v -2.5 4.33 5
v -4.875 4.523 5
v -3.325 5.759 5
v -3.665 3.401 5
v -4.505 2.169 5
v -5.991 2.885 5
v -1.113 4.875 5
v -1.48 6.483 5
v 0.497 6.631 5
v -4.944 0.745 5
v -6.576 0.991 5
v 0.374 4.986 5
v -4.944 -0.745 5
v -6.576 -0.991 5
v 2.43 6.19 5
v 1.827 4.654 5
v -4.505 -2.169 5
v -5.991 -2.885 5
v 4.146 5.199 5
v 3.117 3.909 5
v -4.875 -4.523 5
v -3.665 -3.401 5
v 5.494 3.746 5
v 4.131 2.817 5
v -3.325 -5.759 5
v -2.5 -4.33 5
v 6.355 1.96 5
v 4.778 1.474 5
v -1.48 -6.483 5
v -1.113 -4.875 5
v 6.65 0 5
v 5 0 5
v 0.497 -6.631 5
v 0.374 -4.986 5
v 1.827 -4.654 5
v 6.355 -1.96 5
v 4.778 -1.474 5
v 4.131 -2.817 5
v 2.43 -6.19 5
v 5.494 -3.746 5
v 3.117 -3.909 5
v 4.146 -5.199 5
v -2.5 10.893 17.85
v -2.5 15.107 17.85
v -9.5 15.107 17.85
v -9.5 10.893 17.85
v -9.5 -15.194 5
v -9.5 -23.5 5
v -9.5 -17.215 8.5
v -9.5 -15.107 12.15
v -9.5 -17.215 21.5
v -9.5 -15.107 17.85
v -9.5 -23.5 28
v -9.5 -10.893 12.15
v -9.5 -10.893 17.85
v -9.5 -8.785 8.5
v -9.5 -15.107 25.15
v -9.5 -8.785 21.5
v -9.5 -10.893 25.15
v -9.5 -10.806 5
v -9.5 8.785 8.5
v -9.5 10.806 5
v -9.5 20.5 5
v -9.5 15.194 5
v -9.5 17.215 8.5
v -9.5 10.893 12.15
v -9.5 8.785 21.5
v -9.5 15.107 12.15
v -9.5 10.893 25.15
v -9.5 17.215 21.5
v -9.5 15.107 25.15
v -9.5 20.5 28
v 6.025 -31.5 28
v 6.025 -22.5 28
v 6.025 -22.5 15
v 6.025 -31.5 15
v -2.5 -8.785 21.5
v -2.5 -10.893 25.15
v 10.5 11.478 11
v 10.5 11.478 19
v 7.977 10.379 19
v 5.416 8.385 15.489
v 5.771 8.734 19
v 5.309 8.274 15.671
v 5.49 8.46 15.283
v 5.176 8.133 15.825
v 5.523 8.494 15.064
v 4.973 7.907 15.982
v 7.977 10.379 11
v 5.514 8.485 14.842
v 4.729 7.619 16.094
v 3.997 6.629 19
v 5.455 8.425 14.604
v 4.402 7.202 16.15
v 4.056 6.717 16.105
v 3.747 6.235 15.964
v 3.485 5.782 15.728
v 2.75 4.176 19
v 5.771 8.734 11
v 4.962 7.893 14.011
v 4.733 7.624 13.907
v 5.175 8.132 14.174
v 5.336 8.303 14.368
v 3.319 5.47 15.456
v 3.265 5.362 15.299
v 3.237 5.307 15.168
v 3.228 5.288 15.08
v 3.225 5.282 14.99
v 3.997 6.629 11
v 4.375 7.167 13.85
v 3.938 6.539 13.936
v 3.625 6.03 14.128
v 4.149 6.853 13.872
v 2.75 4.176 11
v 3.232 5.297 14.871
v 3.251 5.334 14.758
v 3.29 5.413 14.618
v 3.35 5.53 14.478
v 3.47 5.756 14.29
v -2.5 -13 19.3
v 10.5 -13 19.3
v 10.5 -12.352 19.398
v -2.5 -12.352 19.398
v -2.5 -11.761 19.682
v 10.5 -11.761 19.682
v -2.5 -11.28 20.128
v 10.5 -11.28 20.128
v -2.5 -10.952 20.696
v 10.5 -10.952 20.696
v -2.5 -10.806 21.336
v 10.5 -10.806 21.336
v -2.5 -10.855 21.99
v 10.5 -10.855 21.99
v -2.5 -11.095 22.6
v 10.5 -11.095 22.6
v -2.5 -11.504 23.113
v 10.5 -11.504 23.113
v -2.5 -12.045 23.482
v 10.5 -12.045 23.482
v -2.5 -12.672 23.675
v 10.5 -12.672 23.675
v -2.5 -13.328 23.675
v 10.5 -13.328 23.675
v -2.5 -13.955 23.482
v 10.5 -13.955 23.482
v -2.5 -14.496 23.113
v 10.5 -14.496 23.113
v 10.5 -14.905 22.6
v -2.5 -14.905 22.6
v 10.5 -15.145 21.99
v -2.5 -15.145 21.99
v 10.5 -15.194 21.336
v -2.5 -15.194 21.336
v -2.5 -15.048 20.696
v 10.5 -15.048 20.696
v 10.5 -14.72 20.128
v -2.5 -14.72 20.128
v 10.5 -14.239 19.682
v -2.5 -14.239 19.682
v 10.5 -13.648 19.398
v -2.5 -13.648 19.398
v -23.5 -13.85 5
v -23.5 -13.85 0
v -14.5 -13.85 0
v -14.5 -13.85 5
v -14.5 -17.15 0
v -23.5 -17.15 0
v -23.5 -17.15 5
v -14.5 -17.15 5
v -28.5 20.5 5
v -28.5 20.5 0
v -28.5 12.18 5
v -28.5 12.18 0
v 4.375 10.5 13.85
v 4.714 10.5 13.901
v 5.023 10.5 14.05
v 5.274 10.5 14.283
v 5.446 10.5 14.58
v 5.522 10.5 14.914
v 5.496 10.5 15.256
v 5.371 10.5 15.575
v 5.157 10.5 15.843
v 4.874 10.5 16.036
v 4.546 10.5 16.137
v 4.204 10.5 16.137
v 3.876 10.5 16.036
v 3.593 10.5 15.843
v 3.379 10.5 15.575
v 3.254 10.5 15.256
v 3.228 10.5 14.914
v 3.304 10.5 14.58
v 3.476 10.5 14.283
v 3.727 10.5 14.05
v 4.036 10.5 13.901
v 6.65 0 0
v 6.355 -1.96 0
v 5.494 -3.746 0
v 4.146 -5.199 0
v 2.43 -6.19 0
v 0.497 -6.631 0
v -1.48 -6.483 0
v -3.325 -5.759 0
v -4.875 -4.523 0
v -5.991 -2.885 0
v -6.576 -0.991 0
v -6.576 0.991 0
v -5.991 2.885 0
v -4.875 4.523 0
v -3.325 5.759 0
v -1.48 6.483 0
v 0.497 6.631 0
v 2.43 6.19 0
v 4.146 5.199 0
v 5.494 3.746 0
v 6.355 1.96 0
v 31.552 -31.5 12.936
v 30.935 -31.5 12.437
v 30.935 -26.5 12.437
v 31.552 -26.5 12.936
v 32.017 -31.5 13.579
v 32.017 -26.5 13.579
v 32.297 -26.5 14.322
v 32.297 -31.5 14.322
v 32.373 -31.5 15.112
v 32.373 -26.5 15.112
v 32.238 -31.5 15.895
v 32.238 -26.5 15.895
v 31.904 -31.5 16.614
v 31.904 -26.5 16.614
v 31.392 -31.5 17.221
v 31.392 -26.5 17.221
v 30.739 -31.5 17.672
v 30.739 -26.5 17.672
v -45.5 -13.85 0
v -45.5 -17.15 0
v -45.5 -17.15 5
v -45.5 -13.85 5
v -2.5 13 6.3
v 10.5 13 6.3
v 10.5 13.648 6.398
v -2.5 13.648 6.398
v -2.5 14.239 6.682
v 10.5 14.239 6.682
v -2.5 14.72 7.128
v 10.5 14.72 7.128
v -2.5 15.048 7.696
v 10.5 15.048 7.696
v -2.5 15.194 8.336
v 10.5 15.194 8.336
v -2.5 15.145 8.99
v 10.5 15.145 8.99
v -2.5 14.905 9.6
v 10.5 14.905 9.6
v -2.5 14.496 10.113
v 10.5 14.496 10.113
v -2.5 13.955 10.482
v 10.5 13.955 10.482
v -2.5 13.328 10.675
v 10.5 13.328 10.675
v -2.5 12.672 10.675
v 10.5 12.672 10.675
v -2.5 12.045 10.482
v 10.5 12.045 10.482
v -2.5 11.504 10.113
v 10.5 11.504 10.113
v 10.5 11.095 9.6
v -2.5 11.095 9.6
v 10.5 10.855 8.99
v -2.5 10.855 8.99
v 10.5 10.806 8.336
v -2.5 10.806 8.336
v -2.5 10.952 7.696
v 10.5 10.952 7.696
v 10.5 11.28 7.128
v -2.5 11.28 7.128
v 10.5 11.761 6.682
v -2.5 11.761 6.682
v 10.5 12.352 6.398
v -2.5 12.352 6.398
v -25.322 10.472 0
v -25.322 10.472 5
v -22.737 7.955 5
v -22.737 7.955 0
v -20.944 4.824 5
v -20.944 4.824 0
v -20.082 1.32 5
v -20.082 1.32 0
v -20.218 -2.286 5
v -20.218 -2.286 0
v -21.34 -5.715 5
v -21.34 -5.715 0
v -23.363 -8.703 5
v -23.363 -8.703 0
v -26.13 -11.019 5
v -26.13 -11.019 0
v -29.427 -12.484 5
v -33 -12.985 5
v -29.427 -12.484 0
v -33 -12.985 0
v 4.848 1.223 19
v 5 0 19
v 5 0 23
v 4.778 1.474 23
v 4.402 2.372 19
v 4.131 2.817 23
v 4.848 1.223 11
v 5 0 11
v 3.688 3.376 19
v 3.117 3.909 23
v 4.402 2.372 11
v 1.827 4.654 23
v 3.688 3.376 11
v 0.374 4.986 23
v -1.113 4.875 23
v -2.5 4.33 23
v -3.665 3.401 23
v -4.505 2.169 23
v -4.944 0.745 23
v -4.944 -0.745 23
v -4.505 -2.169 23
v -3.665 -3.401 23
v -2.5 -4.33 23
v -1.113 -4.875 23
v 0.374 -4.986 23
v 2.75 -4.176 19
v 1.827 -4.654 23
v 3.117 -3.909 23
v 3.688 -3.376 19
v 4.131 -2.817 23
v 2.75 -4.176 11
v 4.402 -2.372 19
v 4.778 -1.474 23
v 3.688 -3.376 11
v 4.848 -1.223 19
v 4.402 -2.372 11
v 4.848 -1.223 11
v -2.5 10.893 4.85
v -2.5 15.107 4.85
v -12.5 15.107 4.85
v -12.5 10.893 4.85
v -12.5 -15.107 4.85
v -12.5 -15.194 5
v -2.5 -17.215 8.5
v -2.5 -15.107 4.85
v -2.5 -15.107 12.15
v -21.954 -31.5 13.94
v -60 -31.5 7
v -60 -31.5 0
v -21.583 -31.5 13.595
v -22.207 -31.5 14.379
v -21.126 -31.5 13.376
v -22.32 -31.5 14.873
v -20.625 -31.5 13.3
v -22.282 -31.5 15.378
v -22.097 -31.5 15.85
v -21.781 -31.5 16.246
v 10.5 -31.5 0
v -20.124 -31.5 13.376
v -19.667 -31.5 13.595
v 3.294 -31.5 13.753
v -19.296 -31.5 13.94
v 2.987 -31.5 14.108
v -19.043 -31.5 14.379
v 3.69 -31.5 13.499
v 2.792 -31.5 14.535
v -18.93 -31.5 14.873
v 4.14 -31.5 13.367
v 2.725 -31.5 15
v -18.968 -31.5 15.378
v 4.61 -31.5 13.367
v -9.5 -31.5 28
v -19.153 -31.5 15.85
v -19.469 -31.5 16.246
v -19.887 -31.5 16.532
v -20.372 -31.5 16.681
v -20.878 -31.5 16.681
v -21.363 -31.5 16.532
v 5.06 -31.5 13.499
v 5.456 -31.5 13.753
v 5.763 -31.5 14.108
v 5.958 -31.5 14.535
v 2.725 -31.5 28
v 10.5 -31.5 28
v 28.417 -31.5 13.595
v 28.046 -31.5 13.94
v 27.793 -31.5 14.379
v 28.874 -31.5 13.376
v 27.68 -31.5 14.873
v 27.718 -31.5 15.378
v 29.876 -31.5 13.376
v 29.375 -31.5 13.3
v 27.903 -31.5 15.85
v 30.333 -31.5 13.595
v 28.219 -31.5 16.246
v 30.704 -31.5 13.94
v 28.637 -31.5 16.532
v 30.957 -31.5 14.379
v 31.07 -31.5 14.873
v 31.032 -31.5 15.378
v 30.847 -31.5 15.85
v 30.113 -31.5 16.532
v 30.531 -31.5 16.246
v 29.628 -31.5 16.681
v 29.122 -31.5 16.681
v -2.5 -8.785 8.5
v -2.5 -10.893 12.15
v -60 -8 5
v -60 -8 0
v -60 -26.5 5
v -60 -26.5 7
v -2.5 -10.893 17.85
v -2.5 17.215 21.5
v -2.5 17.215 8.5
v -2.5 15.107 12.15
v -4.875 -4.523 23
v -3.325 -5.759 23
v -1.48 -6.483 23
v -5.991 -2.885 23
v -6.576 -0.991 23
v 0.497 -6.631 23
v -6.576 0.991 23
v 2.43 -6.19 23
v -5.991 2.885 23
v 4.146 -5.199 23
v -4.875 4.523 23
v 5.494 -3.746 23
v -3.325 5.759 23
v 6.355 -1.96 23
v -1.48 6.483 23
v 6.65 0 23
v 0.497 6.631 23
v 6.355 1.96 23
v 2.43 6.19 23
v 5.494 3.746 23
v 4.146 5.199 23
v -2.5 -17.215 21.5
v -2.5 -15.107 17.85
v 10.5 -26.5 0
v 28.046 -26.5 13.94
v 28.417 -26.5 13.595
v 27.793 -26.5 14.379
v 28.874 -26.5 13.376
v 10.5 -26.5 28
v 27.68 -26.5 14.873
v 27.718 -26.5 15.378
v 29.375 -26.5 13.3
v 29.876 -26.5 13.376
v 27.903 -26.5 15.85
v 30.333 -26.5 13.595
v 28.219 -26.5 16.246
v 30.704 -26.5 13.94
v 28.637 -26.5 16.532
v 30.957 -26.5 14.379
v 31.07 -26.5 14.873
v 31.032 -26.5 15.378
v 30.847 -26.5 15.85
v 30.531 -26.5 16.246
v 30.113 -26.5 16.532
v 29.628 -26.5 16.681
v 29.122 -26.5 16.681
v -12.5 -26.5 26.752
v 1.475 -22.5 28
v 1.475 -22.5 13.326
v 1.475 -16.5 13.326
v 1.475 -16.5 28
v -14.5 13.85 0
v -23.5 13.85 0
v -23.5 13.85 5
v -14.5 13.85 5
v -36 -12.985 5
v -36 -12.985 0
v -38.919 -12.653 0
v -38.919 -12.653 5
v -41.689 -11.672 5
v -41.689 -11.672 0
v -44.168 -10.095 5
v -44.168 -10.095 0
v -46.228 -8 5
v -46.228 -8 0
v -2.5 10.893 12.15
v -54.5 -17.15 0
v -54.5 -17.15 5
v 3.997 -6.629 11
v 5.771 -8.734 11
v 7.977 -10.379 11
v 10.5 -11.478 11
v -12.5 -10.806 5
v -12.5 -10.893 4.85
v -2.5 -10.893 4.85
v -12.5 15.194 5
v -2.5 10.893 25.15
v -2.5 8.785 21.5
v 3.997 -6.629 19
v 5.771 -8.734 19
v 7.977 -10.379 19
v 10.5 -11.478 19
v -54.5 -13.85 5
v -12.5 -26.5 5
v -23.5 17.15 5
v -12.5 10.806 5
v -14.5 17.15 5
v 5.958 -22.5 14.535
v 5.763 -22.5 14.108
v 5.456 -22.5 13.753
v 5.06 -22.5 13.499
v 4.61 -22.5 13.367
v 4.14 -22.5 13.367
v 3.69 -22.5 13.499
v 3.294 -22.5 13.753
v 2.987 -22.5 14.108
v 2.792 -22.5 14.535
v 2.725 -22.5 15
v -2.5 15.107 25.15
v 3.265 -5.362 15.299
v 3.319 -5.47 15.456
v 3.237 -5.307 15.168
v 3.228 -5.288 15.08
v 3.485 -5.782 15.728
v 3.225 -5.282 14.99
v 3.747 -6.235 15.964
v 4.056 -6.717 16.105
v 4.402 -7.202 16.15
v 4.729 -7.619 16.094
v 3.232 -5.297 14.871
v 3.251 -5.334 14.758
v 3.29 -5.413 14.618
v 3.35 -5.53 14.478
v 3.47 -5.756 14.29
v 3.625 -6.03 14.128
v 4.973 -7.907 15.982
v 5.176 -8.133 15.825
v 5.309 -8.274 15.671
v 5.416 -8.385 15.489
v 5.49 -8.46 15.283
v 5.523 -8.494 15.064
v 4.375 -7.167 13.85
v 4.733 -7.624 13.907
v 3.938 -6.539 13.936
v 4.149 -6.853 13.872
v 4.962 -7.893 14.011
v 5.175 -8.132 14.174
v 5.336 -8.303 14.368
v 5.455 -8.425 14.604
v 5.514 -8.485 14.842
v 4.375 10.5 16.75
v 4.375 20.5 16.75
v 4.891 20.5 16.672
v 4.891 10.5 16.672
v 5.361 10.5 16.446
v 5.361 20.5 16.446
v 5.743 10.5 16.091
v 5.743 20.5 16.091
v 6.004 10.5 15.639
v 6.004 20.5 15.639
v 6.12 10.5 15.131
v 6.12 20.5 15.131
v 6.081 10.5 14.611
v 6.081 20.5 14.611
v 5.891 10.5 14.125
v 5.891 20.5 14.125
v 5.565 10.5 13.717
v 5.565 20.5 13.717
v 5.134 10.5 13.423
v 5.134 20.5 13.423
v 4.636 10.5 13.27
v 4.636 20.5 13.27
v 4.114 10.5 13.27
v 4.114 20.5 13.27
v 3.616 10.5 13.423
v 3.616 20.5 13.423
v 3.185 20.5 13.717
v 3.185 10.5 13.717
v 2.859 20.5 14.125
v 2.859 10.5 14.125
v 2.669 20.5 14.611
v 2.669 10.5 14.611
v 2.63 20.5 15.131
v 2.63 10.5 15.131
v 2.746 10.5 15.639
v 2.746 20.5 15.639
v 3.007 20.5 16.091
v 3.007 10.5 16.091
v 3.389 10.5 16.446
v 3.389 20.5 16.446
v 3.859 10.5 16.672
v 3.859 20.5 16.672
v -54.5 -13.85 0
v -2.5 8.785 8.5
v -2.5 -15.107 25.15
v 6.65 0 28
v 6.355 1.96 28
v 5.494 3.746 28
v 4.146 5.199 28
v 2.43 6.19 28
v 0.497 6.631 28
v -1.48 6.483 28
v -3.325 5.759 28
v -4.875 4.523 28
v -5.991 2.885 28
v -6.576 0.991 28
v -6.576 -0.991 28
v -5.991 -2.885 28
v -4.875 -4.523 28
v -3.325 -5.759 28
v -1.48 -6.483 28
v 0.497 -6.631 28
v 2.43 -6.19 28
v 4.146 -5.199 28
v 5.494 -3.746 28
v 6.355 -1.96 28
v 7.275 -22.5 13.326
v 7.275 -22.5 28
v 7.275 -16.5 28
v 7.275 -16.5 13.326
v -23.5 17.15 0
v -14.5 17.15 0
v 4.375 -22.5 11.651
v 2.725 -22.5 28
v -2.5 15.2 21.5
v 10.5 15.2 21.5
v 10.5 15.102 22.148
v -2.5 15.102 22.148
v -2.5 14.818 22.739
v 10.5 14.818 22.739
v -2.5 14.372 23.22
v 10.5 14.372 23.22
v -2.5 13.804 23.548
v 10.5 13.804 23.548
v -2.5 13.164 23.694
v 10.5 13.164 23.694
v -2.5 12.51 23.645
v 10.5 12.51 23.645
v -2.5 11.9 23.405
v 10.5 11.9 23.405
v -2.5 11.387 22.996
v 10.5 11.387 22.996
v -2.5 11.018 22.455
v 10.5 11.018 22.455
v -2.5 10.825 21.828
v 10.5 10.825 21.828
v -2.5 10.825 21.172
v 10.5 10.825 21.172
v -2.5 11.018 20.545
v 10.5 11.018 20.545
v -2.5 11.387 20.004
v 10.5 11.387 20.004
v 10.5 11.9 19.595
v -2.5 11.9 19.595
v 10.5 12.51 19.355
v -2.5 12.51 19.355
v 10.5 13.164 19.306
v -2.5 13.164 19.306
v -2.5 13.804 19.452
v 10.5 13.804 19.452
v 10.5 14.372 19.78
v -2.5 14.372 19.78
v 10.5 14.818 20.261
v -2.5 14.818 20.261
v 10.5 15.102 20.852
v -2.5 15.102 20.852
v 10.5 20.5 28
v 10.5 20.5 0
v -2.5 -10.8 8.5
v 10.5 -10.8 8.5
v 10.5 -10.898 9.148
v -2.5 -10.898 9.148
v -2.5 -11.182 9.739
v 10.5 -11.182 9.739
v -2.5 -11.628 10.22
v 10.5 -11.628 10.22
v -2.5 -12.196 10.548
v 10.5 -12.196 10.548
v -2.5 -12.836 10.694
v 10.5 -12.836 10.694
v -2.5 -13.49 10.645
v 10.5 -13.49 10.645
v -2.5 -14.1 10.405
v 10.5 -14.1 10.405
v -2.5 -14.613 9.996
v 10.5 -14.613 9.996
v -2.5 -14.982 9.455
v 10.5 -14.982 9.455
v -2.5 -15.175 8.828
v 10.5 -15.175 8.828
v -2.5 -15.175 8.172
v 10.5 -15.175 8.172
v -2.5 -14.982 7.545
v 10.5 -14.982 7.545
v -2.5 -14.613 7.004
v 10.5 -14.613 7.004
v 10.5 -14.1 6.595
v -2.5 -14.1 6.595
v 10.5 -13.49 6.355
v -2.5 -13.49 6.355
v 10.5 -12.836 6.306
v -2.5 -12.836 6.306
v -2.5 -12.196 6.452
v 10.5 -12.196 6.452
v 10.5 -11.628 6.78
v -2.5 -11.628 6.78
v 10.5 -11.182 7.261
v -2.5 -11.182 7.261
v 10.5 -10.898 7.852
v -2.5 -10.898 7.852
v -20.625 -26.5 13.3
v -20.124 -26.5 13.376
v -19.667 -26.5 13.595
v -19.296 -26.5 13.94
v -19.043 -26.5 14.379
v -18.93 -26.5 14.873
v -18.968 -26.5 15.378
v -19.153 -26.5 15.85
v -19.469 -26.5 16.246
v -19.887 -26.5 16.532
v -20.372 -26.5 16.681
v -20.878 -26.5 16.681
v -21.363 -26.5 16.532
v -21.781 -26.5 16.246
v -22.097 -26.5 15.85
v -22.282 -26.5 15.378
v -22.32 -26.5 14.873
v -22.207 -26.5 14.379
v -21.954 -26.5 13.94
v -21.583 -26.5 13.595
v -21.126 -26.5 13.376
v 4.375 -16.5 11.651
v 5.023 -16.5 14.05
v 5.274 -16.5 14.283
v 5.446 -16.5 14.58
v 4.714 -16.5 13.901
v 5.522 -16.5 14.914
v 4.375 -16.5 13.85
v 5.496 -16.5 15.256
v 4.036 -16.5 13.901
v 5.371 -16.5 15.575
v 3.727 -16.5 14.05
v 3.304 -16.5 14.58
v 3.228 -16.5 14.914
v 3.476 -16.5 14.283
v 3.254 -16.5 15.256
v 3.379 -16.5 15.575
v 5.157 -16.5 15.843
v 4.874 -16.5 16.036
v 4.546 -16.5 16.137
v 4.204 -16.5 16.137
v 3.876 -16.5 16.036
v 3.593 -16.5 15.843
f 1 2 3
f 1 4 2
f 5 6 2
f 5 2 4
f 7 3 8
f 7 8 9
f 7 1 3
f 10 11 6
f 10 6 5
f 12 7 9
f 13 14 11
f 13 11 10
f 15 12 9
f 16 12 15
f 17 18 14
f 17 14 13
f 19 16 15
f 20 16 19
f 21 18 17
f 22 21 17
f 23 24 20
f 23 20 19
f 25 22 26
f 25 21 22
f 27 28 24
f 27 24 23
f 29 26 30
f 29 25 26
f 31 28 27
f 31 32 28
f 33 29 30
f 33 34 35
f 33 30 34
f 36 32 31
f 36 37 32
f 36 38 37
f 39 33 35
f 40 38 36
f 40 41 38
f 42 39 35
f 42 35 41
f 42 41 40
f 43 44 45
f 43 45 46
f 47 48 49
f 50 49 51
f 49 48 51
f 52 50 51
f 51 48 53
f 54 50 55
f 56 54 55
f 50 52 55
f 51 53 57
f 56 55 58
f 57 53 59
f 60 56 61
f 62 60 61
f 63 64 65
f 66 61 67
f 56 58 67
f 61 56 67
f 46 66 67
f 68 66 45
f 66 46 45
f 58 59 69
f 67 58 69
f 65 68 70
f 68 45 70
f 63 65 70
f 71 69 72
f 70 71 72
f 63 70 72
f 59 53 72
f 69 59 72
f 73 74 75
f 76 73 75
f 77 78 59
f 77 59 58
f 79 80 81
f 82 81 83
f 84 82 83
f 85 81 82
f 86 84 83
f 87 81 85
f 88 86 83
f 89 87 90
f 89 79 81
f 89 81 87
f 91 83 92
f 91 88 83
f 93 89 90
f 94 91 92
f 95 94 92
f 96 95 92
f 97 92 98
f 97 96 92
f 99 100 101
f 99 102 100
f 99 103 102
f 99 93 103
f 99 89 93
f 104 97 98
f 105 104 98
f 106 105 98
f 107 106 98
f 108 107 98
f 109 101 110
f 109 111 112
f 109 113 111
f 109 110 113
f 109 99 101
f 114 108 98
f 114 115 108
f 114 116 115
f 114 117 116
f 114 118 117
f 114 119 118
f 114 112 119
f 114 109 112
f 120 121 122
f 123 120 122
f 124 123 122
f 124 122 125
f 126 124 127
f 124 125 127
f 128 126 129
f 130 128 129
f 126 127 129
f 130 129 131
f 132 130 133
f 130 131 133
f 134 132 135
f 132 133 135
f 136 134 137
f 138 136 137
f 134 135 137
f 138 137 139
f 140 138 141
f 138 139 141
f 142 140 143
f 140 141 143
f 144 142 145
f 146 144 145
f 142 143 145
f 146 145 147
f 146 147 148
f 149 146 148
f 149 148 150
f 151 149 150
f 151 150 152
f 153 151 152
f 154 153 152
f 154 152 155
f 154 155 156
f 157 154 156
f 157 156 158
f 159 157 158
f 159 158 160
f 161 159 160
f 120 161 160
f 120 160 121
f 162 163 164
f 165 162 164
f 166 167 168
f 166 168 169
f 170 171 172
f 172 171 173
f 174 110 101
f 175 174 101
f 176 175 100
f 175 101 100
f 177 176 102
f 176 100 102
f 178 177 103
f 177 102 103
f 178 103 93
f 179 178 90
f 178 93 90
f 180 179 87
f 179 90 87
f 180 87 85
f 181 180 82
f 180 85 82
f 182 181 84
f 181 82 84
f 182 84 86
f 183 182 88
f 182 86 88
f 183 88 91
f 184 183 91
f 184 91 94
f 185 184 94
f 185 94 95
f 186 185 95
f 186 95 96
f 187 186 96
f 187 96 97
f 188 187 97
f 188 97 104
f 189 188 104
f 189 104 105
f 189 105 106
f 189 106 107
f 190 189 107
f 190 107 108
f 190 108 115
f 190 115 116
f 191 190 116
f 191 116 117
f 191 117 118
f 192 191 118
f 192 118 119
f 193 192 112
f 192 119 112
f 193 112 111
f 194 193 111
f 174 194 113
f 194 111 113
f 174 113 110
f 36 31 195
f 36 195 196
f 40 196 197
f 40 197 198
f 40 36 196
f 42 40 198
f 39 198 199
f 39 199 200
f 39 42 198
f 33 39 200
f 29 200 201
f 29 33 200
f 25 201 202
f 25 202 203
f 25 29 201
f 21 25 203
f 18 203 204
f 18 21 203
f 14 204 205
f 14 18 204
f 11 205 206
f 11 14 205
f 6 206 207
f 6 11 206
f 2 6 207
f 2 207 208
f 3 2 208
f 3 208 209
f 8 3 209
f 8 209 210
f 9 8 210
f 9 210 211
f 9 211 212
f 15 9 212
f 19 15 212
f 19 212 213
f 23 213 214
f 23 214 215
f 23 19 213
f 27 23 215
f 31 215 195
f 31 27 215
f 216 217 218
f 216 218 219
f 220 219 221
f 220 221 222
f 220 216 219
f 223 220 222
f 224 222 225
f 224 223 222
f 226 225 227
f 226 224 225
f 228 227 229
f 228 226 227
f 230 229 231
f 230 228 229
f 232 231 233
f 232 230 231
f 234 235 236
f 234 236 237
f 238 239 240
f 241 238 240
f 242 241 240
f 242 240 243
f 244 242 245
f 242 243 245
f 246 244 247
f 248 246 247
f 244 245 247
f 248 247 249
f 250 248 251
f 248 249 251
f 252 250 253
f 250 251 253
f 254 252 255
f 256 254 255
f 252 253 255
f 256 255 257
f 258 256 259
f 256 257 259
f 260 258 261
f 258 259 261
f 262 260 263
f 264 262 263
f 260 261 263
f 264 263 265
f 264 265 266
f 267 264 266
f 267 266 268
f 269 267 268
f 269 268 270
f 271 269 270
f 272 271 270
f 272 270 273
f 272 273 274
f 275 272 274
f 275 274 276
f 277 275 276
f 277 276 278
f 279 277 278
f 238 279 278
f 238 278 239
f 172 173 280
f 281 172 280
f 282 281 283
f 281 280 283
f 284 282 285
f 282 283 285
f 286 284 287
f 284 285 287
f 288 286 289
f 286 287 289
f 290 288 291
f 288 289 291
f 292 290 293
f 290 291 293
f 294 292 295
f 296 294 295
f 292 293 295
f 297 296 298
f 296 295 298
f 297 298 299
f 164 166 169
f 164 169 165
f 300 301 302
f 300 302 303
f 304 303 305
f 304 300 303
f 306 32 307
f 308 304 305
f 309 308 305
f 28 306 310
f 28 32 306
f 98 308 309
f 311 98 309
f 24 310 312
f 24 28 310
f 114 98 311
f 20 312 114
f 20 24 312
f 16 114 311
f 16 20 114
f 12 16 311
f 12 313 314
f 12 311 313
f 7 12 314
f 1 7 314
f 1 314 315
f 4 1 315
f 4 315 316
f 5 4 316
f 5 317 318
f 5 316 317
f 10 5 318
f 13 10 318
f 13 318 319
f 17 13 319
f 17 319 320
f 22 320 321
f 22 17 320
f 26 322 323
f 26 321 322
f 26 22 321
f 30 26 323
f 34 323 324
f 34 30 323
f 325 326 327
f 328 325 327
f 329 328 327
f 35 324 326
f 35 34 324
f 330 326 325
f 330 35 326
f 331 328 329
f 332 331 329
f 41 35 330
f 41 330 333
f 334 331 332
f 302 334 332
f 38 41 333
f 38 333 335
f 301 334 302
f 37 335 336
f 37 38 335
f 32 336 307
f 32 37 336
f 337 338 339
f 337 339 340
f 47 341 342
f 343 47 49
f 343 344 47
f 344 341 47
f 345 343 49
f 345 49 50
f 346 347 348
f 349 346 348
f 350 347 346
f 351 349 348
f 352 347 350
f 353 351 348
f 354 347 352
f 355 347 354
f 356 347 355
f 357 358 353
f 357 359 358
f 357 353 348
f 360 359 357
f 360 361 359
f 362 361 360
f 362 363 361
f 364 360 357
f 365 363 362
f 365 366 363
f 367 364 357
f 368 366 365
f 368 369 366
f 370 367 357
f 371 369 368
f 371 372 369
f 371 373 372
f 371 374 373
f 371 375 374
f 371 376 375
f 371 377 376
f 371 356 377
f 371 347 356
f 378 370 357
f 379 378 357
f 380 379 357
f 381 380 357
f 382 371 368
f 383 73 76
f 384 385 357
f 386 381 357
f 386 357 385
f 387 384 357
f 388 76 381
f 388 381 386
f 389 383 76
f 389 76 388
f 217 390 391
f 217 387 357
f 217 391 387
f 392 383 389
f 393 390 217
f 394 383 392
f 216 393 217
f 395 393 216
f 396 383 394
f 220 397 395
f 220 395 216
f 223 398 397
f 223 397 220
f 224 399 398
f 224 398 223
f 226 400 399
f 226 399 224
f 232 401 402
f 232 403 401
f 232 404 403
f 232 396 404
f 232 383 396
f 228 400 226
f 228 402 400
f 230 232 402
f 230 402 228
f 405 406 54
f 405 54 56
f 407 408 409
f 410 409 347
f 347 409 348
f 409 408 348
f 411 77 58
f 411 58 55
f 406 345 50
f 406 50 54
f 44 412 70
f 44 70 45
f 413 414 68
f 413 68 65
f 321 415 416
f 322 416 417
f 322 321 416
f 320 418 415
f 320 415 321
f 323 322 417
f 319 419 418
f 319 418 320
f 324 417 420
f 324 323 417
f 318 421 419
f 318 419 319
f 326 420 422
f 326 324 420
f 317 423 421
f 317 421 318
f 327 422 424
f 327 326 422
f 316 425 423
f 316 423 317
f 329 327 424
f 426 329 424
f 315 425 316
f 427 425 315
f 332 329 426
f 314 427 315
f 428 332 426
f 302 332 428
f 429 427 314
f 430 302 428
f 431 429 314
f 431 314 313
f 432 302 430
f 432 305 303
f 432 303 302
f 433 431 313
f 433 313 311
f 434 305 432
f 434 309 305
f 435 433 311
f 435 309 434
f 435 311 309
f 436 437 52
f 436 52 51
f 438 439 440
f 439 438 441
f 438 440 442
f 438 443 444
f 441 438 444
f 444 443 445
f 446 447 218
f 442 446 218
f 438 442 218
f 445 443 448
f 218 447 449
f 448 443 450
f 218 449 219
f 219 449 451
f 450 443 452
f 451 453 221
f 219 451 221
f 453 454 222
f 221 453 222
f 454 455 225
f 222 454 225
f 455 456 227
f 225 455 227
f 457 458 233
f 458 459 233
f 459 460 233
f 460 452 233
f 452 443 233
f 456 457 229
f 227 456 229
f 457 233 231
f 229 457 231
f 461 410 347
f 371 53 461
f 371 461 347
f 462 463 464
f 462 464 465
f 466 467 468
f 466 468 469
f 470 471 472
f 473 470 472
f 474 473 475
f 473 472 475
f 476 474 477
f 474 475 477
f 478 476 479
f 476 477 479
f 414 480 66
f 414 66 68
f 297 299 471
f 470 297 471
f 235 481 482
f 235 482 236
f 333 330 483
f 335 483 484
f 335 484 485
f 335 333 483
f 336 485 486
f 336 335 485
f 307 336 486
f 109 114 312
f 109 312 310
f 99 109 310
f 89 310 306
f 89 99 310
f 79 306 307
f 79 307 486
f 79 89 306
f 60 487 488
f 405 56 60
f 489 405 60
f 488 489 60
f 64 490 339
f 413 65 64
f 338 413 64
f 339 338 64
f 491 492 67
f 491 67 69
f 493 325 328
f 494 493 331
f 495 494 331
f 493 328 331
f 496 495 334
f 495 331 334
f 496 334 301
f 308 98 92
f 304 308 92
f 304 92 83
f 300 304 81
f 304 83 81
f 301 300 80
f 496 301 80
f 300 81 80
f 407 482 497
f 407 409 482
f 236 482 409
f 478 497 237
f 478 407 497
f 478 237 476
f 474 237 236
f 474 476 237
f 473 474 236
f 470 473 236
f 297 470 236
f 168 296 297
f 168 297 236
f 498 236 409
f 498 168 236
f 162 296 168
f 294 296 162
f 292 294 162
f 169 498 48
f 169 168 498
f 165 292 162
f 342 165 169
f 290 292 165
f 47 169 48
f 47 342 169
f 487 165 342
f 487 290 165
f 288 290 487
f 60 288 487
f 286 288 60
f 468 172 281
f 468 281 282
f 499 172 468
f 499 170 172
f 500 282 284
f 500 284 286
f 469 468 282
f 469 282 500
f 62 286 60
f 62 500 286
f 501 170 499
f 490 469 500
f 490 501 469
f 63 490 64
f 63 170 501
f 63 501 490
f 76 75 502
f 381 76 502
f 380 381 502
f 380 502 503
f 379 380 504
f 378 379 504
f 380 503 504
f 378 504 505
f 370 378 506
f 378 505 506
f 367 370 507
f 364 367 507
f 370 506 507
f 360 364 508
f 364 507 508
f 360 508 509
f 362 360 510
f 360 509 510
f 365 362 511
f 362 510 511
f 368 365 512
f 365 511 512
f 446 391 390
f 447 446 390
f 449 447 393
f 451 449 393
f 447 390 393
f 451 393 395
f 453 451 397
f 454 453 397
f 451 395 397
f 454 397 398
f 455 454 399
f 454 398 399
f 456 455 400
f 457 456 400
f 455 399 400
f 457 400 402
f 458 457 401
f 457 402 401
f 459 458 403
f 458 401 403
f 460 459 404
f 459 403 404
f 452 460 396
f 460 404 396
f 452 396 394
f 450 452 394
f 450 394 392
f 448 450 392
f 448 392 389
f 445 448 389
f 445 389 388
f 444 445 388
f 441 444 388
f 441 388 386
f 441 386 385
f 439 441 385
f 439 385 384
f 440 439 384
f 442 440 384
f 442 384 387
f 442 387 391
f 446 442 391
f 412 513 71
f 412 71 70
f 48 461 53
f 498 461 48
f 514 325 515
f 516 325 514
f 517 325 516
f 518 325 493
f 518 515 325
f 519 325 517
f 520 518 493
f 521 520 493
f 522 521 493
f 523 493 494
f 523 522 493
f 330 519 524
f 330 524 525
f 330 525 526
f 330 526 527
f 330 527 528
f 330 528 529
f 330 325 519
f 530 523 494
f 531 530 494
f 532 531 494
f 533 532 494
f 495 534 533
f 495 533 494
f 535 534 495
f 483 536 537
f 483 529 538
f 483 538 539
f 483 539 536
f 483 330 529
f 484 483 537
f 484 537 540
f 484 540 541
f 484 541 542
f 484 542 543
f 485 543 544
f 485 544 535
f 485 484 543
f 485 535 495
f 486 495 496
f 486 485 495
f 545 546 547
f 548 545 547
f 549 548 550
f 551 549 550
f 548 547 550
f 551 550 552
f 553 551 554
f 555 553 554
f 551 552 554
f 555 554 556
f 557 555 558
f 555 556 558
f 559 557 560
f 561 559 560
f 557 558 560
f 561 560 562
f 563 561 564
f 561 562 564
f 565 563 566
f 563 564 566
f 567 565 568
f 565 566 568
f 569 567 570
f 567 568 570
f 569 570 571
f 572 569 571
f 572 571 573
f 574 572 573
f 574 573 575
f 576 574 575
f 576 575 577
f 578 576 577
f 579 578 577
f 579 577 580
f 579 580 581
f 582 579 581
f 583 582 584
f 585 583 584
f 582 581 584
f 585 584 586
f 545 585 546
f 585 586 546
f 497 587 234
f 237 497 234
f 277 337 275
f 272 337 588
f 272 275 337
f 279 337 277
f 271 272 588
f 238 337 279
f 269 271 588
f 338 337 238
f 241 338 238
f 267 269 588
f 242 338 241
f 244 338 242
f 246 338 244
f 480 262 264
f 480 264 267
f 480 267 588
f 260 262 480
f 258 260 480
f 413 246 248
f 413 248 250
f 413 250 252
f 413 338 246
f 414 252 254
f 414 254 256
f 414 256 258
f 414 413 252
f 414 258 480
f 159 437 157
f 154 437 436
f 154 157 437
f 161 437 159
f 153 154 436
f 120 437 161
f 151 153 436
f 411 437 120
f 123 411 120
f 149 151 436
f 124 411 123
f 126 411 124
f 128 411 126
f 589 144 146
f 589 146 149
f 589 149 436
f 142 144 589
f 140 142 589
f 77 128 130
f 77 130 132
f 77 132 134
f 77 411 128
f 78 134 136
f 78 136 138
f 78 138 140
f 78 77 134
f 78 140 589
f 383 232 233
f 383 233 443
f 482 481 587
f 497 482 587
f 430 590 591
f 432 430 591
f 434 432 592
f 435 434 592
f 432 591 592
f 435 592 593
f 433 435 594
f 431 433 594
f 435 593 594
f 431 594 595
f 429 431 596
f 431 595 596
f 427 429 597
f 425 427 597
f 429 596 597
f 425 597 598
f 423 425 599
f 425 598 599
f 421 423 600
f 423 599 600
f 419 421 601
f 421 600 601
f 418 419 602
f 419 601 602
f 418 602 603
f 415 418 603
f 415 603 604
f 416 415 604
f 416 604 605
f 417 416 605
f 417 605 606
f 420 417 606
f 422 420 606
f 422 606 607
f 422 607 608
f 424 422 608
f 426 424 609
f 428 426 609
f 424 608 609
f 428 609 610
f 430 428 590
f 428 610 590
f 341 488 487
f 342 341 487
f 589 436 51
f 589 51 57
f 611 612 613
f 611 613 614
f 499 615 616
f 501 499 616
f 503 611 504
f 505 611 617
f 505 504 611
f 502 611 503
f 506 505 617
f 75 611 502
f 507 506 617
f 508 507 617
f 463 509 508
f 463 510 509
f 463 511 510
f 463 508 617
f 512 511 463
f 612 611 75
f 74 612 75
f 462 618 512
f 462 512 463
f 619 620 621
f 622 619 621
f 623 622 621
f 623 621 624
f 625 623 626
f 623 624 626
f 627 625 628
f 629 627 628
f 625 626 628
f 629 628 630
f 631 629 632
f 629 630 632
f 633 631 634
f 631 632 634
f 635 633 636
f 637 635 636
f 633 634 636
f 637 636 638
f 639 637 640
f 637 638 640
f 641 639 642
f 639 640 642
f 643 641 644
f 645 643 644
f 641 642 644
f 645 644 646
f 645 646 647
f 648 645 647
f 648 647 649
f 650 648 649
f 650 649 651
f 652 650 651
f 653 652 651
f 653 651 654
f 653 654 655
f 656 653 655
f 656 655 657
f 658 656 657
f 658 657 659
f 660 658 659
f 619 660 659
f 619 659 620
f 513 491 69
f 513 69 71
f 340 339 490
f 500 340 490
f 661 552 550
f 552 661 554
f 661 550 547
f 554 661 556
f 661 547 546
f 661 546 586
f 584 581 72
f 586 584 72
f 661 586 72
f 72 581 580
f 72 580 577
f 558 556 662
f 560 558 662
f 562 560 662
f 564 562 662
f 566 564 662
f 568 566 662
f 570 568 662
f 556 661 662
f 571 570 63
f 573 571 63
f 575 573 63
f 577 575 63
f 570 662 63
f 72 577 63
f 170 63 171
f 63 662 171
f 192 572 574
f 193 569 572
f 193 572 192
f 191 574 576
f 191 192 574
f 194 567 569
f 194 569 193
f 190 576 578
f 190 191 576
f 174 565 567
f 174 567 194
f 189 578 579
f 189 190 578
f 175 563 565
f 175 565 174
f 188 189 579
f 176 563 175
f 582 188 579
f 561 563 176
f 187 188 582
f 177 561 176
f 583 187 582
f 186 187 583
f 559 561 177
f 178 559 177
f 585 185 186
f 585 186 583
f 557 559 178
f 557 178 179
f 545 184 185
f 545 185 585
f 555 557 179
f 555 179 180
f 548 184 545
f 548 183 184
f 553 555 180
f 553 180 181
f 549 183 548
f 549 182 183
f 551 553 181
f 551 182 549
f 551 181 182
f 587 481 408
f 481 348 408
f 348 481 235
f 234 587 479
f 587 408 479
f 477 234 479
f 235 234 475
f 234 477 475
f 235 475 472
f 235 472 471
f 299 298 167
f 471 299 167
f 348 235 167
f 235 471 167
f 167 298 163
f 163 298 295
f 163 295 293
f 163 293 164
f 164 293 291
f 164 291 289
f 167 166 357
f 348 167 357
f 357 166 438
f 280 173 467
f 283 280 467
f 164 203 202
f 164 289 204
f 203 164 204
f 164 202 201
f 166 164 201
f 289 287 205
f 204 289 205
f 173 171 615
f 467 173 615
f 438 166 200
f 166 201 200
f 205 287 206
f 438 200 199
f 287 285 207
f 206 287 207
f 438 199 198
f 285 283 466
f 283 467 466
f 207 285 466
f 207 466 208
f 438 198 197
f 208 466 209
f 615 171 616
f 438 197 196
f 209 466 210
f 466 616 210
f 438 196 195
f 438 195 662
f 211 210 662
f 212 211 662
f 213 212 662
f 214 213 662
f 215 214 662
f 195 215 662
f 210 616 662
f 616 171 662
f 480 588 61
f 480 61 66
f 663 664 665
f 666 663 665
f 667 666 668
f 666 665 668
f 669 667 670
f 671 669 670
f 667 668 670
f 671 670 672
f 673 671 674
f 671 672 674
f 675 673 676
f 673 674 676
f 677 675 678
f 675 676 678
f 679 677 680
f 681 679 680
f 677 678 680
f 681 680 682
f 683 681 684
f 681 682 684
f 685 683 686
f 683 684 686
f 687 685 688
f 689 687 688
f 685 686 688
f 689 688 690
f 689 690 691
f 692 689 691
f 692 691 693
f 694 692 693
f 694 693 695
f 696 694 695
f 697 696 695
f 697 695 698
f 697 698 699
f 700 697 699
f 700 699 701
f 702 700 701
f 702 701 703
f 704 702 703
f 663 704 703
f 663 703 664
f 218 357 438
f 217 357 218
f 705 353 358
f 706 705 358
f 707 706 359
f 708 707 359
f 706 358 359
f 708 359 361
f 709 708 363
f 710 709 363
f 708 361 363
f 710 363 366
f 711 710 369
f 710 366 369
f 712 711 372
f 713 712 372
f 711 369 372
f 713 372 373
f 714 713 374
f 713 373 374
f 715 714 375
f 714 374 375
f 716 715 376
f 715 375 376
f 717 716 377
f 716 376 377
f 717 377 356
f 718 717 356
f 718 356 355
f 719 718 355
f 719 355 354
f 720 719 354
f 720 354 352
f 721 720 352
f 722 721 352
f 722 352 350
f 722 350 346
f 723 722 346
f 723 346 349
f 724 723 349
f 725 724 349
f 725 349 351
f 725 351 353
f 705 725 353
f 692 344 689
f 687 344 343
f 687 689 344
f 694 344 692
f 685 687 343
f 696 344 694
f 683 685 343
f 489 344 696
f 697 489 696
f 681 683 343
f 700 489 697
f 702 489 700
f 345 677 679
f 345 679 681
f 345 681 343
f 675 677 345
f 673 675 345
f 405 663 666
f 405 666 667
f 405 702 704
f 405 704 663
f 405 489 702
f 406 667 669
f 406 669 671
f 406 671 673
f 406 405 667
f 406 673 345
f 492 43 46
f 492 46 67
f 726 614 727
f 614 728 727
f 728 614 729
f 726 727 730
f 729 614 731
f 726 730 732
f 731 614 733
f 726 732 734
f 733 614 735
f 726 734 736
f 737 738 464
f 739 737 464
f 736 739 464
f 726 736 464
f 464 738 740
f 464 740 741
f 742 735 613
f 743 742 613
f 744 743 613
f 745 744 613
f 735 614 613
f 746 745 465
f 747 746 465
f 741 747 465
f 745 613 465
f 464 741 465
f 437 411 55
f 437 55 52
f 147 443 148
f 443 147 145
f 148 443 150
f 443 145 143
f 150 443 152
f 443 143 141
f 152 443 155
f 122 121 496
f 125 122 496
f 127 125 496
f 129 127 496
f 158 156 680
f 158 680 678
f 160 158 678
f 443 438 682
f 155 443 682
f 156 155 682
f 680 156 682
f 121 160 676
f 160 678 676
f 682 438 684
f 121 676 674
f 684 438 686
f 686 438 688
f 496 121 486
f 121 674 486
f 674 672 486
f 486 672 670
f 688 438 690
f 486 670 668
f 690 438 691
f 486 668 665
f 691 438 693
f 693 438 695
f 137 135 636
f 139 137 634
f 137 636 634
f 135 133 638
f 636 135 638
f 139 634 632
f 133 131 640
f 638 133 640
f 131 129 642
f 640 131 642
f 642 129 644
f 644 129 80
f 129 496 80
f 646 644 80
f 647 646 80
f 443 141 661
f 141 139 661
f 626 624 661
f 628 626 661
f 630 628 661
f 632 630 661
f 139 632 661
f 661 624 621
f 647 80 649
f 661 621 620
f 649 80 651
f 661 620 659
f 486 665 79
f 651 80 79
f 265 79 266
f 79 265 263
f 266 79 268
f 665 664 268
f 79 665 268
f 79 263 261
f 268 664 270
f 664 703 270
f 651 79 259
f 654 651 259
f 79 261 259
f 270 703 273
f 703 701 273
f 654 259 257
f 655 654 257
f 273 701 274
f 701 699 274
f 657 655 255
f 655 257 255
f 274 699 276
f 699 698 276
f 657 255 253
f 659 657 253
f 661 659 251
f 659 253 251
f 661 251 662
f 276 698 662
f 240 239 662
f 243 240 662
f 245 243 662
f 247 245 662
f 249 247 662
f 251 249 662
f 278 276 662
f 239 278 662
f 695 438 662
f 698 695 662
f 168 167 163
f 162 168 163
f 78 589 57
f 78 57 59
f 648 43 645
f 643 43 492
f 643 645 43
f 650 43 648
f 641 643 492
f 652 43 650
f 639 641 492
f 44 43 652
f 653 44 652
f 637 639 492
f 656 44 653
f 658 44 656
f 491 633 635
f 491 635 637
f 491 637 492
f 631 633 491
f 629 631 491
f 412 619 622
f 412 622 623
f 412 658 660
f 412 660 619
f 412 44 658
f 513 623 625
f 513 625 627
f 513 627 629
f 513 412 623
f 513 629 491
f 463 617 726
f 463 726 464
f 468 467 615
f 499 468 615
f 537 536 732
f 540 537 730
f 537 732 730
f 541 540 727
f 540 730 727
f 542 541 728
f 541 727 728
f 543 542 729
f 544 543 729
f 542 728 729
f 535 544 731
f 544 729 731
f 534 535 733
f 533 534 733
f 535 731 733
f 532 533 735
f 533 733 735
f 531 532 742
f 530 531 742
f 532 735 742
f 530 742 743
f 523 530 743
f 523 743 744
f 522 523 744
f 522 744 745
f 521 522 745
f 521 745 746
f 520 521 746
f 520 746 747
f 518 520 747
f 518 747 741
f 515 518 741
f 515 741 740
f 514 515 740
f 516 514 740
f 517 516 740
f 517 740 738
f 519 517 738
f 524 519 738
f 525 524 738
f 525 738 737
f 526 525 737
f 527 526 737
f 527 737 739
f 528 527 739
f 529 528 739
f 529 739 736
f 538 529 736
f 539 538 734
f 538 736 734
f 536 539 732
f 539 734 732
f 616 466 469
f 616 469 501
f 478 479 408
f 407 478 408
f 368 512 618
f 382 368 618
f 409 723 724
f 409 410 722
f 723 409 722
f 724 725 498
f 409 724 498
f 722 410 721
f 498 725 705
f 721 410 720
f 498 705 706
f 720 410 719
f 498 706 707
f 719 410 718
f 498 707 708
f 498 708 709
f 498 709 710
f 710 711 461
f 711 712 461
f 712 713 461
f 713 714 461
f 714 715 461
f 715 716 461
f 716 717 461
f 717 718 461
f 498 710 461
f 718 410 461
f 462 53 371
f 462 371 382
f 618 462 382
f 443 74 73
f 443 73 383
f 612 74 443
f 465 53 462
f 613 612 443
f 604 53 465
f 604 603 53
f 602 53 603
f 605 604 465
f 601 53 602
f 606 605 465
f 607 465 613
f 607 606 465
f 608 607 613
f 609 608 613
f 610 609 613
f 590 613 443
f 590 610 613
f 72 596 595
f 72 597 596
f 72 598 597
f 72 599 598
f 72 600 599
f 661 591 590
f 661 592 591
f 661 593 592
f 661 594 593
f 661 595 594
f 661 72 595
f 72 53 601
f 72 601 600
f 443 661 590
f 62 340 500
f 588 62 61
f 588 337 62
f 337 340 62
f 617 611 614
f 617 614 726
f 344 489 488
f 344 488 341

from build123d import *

# Parameters (mm, degrees)
SKETCH1_R               = 5
SKETCH1_W               = 9
SKETCH1_H               = 3.3
BOSS_EXTRUDE1_DEPTH     = 28
SKETCH2_W               = 50.5
SKETCH2_H               = 47
CUT_EXTRUDE1_DEPTH      = 23
SKETCH3_R               = 6.65
CUT_EXTRUDE2_DEPTH      = 5
CUT_EXTRUDE3_START      = -5
SKETCH4_R               = 6.65
CUT_EXTRUDE3_DEPTH      = 5
SKETCH5_R               = 12
CUT_EXTRUDE4_DEPTH      = 8
CUT_EXTRUDE5_START      = -9
CUT_EXTRUDE5_DEPTH      = 9
CUT_EXTRUDE6_DEPTH      = 6
SKETCH8_R               = 1.15
CUT_EXTRUDE7_DEPTH      = 85.190260719
CHAMFER1_SIZE           = 21
CHAMFER1_SIZE2          = 50.5
SKETCH9_R               = 2.2
CUT_EXTRUDE8_DEPTH      = 83.137080542
CUT_EXTRUDE9_DEPTH      = 3
CUT_EXTRUDE9_DEPTH_BACK = 7
SKETCH12_R              = 1.75
CUT_EXTRUDE10_DEPTH     = 10
CHAMFER2_SIZE           = 3
BOSS_EXTRUDE3_DEPTH     = 5
SKETCH15_R              = 1.7
CUT_EXTRUDE11_DEPTH     = 85.190260719


with BuildPart() as part:
    # Sketch1 → Boss-Extrude1 (new body)
    with BuildSketch(Plane.XY):
        with BuildLine():
            Line((-60, -31.5), (10.5, -31.5))
            Line((10.5, -31.5), (10.5, 20.5))
            Line((10.5, 20.5), (-28.5, 20.5))
            Line((-28.5, 20.5), (-28.5, 12.180409823))
            ThreePointArc((-28.5, 12.180409823), (-20.217668105, -2.285689125), (-33, -12.985083113))
            Line((-33, -12.985083113), (-36, -12.985083113))
            ThreePointArc((-36, -12.985083113), (-41.689100041, -11.672468641), (-46.228019527, -8))
            Line((-46.228019527, -8), (-60, -8))
            Line((-60, -8), (-60, -31.5))
        make_face()
        Circle(SKETCH1_R, mode=Mode.SUBTRACT)
        with Locations((-19, 15.5)):
            Rectangle(SKETCH1_W, SKETCH1_H, mode=Mode.SUBTRACT)
        with Locations((-19, -15.5)):
            Rectangle(SKETCH1_W, SKETCH1_H, mode=Mode.SUBTRACT)
        with Locations((-50, -15.5)):
            Rectangle(SKETCH1_W, SKETCH1_H, mode=Mode.SUBTRACT)
    extrude(amount=BOSS_EXTRUDE1_DEPTH)

    # Sketch2 → Cut-Extrude1 (cut)
    with BuildSketch(Plane.XY.offset(28)):
        with Locations((-34.75, -3)):
            Rectangle(SKETCH2_W, SKETCH2_H)
    extrude(amount=-CUT_EXTRUDE1_DEPTH, mode=Mode.SUBTRACT)

    # Sketch3 → Cut-Extrude2 (cut)
    with BuildSketch(Plane.XY.offset(28)):
        Circle(SKETCH3_R)
    extrude(amount=-CUT_EXTRUDE2_DEPTH, mode=Mode.SUBTRACT)

    # Sketch4 → Cut-Extrude3 (cut)
    with BuildSketch(Plane(origin=(0, 0, 0), x_dir=(-1, 0, 0), z_dir=(0, 0, -1)).offset(CUT_EXTRUDE3_START)):
        with Locations(Location((0, 0, 0), (0, 0, 180))):
            Circle(SKETCH4_R)
    extrude(amount=CUT_EXTRUDE3_DEPTH, mode=Mode.SUBTRACT)

    # Sketch5 → Cut-Extrude4 (cut)
    with BuildSketch(Plane.XY.offset(11)):
        with Locations((14, 0)):
            Circle(SKETCH5_R)
    extrude(amount=CUT_EXTRUDE4_DEPTH, mode=Mode.SUBTRACT)

    # Sketch6 → Cut-Extrude5 (cut)
    with BuildSketch(Plane.XZ.offset(31.5).offset(CUT_EXTRUDE5_START)):
        with BuildLine():
            Line((2.725, 15), (2.725, 28))
            Line((2.725, 28), (6.025, 28))
            Line((6.025, 28), (6.025, 15))
            ThreePointArc((6.025, 15), (4.375, 13.35), (2.725, 15))
        make_face()
    extrude(amount=CUT_EXTRUDE5_DEPTH, mode=Mode.SUBTRACT)

    # Sketch7 → Cut-Extrude6 (cut)
    with BuildSketch(Plane.XZ.offset(22.5)):
        Polygon((1.475, 28), (7.275, 28), (7.275, 13.325684219), (4.375, 11.651368439), (1.475, 13.325684219), align=None)
    extrude(amount=-CUT_EXTRUDE6_DEPTH, mode=Mode.SUBTRACT)

    # Sketch8 → Cut-Extrude7 (cut, through all)
    with BuildSketch(Plane.XZ.offset(31.5)):
        with Locations(Location((4.375, 15, 0), (0, 0, 270))):
            Circle(SKETCH8_R)
    extrude(amount=-CUT_EXTRUDE7_DEPTH, mode=Mode.SUBTRACT)

    # Chamfer1
    chamfer1_edges = [part.edges().sort_by_distance(p)[0] for p in [
        (-60, -29, 28),
    ]]
    chamfer1_side = [part.faces().sort_by_distance(p)[0] for p in [
        (-60, -19.75, 0.365547535),
    ]]
    chamfer(chamfer1_edges, length=CHAMFER1_SIZE, length2=CHAMFER1_SIZE2, reference=chamfer1_side[0])

    # Sketch9 → Cut-Extrude8 (cut, through all)
    with BuildSketch(Plane(origin=(10.5, 0, 0), x_dir=(0, 0, -1), z_dir=(1, 0, 0))):
        with Locations((-8.5, 13)):
            Circle(SKETCH9_R)
        with Locations(Location((-21.5, 13, 0), (0, 0, 90))):
            Circle(SKETCH9_R)
        with Locations(Location((-8.5, -13, 0), (0, 0, 90))):
            Circle(SKETCH9_R)
        with Locations((-21.5, -13)):
            Circle(SKETCH9_R)
    extrude(amount=-CUT_EXTRUDE8_DEPTH, mode=Mode.SUBTRACT)

    # Sketch10 → Cut-Extrude9 (cut, two sides: drawn at the far end of the back side and taken through both)
    with BuildSketch(Plane.ZY.offset(9.5).offset(-CUT_EXTRUDE9_DEPTH_BACK)):
        Polygon((4.85, 15.107328483), (4.85, 10.892671517), (8.5, 8.785343035), (12.15, 10.892671517), (12.15, 15.107328483), (8.5, 17.214656965), align=None)
        Polygon((25.15, 10.892671517), (25.15, 15.107328483), (21.5, 17.214656965), (17.85, 15.107328483), (17.85, 10.892671517), (21.5, 8.785343035), align=None)
        Polygon((25.15, -10.892671517), (21.5, -8.785343035), (17.85, -10.892671517), (17.85, -15.107328483), (21.5, -17.214656965), (25.15, -15.107328483), align=None)
        Polygon((12.15, -10.892671517), (8.5, -8.785343035), (4.85, -10.892671517), (4.85, -15.107328483), (8.5, -17.214656965), (12.15, -15.107328483), align=None)
    extrude(amount=CUT_EXTRUDE9_DEPTH + CUT_EXTRUDE9_DEPTH_BACK, mode=Mode.SUBTRACT)

    # Sketch12 → Cut-Extrude10 (cut)
    with BuildSketch(Plane(origin=(0, 20.5, 0), x_dir=(1, 0, 0), z_dir=(0, 1, 0))):
        with Locations(Location((4.375, -15, 0), (0, 0, 270))):
            Circle(SKETCH12_R)
    extrude(amount=-CUT_EXTRUDE10_DEPTH, mode=Mode.SUBTRACT)

    # Chamfer2
    chamfer2_edges = [part.edges().sort_by_distance(p)[0] for p in [
        (-9.5, -26.5, 16.5),
    ]]
    chamfer(chamfer2_edges, length=CHAMFER2_SIZE)

    # Sketch14 → Boss-Extrude3 (add)
    with BuildSketch(Plane.XZ.offset(31.5)):
        with BuildLine():
            Line((10.5, 0), (30.934731544, 12.437337808))
            ThreePointArc((30.934731544, 12.437337808), (32.372897026, 15.112309482), (30.73861997, 17.672178994))
            Line((30.73861997, 17.672178994), (10.5, 28))
            Line((10.5, 28), (10.5, 0))
        make_face()
    extrude(amount=-BOSS_EXTRUDE3_DEPTH)

    # Sketch15 → Cut-Extrude11 (cut, through all)
    with BuildSketch(Plane.XZ.offset(31.5)):
        with Locations(Location((-20.625, 15, 0), (0, 0, 270))):
            Circle(SKETCH15_R)
        with Locations(Location((29.375, 15, 0), (0, 0, 270))):
            Circle(SKETCH15_R)
    extrude(amount=-CUT_EXTRUDE11_DEPTH, mode=Mode.SUBTRACT)


solid = part.part
